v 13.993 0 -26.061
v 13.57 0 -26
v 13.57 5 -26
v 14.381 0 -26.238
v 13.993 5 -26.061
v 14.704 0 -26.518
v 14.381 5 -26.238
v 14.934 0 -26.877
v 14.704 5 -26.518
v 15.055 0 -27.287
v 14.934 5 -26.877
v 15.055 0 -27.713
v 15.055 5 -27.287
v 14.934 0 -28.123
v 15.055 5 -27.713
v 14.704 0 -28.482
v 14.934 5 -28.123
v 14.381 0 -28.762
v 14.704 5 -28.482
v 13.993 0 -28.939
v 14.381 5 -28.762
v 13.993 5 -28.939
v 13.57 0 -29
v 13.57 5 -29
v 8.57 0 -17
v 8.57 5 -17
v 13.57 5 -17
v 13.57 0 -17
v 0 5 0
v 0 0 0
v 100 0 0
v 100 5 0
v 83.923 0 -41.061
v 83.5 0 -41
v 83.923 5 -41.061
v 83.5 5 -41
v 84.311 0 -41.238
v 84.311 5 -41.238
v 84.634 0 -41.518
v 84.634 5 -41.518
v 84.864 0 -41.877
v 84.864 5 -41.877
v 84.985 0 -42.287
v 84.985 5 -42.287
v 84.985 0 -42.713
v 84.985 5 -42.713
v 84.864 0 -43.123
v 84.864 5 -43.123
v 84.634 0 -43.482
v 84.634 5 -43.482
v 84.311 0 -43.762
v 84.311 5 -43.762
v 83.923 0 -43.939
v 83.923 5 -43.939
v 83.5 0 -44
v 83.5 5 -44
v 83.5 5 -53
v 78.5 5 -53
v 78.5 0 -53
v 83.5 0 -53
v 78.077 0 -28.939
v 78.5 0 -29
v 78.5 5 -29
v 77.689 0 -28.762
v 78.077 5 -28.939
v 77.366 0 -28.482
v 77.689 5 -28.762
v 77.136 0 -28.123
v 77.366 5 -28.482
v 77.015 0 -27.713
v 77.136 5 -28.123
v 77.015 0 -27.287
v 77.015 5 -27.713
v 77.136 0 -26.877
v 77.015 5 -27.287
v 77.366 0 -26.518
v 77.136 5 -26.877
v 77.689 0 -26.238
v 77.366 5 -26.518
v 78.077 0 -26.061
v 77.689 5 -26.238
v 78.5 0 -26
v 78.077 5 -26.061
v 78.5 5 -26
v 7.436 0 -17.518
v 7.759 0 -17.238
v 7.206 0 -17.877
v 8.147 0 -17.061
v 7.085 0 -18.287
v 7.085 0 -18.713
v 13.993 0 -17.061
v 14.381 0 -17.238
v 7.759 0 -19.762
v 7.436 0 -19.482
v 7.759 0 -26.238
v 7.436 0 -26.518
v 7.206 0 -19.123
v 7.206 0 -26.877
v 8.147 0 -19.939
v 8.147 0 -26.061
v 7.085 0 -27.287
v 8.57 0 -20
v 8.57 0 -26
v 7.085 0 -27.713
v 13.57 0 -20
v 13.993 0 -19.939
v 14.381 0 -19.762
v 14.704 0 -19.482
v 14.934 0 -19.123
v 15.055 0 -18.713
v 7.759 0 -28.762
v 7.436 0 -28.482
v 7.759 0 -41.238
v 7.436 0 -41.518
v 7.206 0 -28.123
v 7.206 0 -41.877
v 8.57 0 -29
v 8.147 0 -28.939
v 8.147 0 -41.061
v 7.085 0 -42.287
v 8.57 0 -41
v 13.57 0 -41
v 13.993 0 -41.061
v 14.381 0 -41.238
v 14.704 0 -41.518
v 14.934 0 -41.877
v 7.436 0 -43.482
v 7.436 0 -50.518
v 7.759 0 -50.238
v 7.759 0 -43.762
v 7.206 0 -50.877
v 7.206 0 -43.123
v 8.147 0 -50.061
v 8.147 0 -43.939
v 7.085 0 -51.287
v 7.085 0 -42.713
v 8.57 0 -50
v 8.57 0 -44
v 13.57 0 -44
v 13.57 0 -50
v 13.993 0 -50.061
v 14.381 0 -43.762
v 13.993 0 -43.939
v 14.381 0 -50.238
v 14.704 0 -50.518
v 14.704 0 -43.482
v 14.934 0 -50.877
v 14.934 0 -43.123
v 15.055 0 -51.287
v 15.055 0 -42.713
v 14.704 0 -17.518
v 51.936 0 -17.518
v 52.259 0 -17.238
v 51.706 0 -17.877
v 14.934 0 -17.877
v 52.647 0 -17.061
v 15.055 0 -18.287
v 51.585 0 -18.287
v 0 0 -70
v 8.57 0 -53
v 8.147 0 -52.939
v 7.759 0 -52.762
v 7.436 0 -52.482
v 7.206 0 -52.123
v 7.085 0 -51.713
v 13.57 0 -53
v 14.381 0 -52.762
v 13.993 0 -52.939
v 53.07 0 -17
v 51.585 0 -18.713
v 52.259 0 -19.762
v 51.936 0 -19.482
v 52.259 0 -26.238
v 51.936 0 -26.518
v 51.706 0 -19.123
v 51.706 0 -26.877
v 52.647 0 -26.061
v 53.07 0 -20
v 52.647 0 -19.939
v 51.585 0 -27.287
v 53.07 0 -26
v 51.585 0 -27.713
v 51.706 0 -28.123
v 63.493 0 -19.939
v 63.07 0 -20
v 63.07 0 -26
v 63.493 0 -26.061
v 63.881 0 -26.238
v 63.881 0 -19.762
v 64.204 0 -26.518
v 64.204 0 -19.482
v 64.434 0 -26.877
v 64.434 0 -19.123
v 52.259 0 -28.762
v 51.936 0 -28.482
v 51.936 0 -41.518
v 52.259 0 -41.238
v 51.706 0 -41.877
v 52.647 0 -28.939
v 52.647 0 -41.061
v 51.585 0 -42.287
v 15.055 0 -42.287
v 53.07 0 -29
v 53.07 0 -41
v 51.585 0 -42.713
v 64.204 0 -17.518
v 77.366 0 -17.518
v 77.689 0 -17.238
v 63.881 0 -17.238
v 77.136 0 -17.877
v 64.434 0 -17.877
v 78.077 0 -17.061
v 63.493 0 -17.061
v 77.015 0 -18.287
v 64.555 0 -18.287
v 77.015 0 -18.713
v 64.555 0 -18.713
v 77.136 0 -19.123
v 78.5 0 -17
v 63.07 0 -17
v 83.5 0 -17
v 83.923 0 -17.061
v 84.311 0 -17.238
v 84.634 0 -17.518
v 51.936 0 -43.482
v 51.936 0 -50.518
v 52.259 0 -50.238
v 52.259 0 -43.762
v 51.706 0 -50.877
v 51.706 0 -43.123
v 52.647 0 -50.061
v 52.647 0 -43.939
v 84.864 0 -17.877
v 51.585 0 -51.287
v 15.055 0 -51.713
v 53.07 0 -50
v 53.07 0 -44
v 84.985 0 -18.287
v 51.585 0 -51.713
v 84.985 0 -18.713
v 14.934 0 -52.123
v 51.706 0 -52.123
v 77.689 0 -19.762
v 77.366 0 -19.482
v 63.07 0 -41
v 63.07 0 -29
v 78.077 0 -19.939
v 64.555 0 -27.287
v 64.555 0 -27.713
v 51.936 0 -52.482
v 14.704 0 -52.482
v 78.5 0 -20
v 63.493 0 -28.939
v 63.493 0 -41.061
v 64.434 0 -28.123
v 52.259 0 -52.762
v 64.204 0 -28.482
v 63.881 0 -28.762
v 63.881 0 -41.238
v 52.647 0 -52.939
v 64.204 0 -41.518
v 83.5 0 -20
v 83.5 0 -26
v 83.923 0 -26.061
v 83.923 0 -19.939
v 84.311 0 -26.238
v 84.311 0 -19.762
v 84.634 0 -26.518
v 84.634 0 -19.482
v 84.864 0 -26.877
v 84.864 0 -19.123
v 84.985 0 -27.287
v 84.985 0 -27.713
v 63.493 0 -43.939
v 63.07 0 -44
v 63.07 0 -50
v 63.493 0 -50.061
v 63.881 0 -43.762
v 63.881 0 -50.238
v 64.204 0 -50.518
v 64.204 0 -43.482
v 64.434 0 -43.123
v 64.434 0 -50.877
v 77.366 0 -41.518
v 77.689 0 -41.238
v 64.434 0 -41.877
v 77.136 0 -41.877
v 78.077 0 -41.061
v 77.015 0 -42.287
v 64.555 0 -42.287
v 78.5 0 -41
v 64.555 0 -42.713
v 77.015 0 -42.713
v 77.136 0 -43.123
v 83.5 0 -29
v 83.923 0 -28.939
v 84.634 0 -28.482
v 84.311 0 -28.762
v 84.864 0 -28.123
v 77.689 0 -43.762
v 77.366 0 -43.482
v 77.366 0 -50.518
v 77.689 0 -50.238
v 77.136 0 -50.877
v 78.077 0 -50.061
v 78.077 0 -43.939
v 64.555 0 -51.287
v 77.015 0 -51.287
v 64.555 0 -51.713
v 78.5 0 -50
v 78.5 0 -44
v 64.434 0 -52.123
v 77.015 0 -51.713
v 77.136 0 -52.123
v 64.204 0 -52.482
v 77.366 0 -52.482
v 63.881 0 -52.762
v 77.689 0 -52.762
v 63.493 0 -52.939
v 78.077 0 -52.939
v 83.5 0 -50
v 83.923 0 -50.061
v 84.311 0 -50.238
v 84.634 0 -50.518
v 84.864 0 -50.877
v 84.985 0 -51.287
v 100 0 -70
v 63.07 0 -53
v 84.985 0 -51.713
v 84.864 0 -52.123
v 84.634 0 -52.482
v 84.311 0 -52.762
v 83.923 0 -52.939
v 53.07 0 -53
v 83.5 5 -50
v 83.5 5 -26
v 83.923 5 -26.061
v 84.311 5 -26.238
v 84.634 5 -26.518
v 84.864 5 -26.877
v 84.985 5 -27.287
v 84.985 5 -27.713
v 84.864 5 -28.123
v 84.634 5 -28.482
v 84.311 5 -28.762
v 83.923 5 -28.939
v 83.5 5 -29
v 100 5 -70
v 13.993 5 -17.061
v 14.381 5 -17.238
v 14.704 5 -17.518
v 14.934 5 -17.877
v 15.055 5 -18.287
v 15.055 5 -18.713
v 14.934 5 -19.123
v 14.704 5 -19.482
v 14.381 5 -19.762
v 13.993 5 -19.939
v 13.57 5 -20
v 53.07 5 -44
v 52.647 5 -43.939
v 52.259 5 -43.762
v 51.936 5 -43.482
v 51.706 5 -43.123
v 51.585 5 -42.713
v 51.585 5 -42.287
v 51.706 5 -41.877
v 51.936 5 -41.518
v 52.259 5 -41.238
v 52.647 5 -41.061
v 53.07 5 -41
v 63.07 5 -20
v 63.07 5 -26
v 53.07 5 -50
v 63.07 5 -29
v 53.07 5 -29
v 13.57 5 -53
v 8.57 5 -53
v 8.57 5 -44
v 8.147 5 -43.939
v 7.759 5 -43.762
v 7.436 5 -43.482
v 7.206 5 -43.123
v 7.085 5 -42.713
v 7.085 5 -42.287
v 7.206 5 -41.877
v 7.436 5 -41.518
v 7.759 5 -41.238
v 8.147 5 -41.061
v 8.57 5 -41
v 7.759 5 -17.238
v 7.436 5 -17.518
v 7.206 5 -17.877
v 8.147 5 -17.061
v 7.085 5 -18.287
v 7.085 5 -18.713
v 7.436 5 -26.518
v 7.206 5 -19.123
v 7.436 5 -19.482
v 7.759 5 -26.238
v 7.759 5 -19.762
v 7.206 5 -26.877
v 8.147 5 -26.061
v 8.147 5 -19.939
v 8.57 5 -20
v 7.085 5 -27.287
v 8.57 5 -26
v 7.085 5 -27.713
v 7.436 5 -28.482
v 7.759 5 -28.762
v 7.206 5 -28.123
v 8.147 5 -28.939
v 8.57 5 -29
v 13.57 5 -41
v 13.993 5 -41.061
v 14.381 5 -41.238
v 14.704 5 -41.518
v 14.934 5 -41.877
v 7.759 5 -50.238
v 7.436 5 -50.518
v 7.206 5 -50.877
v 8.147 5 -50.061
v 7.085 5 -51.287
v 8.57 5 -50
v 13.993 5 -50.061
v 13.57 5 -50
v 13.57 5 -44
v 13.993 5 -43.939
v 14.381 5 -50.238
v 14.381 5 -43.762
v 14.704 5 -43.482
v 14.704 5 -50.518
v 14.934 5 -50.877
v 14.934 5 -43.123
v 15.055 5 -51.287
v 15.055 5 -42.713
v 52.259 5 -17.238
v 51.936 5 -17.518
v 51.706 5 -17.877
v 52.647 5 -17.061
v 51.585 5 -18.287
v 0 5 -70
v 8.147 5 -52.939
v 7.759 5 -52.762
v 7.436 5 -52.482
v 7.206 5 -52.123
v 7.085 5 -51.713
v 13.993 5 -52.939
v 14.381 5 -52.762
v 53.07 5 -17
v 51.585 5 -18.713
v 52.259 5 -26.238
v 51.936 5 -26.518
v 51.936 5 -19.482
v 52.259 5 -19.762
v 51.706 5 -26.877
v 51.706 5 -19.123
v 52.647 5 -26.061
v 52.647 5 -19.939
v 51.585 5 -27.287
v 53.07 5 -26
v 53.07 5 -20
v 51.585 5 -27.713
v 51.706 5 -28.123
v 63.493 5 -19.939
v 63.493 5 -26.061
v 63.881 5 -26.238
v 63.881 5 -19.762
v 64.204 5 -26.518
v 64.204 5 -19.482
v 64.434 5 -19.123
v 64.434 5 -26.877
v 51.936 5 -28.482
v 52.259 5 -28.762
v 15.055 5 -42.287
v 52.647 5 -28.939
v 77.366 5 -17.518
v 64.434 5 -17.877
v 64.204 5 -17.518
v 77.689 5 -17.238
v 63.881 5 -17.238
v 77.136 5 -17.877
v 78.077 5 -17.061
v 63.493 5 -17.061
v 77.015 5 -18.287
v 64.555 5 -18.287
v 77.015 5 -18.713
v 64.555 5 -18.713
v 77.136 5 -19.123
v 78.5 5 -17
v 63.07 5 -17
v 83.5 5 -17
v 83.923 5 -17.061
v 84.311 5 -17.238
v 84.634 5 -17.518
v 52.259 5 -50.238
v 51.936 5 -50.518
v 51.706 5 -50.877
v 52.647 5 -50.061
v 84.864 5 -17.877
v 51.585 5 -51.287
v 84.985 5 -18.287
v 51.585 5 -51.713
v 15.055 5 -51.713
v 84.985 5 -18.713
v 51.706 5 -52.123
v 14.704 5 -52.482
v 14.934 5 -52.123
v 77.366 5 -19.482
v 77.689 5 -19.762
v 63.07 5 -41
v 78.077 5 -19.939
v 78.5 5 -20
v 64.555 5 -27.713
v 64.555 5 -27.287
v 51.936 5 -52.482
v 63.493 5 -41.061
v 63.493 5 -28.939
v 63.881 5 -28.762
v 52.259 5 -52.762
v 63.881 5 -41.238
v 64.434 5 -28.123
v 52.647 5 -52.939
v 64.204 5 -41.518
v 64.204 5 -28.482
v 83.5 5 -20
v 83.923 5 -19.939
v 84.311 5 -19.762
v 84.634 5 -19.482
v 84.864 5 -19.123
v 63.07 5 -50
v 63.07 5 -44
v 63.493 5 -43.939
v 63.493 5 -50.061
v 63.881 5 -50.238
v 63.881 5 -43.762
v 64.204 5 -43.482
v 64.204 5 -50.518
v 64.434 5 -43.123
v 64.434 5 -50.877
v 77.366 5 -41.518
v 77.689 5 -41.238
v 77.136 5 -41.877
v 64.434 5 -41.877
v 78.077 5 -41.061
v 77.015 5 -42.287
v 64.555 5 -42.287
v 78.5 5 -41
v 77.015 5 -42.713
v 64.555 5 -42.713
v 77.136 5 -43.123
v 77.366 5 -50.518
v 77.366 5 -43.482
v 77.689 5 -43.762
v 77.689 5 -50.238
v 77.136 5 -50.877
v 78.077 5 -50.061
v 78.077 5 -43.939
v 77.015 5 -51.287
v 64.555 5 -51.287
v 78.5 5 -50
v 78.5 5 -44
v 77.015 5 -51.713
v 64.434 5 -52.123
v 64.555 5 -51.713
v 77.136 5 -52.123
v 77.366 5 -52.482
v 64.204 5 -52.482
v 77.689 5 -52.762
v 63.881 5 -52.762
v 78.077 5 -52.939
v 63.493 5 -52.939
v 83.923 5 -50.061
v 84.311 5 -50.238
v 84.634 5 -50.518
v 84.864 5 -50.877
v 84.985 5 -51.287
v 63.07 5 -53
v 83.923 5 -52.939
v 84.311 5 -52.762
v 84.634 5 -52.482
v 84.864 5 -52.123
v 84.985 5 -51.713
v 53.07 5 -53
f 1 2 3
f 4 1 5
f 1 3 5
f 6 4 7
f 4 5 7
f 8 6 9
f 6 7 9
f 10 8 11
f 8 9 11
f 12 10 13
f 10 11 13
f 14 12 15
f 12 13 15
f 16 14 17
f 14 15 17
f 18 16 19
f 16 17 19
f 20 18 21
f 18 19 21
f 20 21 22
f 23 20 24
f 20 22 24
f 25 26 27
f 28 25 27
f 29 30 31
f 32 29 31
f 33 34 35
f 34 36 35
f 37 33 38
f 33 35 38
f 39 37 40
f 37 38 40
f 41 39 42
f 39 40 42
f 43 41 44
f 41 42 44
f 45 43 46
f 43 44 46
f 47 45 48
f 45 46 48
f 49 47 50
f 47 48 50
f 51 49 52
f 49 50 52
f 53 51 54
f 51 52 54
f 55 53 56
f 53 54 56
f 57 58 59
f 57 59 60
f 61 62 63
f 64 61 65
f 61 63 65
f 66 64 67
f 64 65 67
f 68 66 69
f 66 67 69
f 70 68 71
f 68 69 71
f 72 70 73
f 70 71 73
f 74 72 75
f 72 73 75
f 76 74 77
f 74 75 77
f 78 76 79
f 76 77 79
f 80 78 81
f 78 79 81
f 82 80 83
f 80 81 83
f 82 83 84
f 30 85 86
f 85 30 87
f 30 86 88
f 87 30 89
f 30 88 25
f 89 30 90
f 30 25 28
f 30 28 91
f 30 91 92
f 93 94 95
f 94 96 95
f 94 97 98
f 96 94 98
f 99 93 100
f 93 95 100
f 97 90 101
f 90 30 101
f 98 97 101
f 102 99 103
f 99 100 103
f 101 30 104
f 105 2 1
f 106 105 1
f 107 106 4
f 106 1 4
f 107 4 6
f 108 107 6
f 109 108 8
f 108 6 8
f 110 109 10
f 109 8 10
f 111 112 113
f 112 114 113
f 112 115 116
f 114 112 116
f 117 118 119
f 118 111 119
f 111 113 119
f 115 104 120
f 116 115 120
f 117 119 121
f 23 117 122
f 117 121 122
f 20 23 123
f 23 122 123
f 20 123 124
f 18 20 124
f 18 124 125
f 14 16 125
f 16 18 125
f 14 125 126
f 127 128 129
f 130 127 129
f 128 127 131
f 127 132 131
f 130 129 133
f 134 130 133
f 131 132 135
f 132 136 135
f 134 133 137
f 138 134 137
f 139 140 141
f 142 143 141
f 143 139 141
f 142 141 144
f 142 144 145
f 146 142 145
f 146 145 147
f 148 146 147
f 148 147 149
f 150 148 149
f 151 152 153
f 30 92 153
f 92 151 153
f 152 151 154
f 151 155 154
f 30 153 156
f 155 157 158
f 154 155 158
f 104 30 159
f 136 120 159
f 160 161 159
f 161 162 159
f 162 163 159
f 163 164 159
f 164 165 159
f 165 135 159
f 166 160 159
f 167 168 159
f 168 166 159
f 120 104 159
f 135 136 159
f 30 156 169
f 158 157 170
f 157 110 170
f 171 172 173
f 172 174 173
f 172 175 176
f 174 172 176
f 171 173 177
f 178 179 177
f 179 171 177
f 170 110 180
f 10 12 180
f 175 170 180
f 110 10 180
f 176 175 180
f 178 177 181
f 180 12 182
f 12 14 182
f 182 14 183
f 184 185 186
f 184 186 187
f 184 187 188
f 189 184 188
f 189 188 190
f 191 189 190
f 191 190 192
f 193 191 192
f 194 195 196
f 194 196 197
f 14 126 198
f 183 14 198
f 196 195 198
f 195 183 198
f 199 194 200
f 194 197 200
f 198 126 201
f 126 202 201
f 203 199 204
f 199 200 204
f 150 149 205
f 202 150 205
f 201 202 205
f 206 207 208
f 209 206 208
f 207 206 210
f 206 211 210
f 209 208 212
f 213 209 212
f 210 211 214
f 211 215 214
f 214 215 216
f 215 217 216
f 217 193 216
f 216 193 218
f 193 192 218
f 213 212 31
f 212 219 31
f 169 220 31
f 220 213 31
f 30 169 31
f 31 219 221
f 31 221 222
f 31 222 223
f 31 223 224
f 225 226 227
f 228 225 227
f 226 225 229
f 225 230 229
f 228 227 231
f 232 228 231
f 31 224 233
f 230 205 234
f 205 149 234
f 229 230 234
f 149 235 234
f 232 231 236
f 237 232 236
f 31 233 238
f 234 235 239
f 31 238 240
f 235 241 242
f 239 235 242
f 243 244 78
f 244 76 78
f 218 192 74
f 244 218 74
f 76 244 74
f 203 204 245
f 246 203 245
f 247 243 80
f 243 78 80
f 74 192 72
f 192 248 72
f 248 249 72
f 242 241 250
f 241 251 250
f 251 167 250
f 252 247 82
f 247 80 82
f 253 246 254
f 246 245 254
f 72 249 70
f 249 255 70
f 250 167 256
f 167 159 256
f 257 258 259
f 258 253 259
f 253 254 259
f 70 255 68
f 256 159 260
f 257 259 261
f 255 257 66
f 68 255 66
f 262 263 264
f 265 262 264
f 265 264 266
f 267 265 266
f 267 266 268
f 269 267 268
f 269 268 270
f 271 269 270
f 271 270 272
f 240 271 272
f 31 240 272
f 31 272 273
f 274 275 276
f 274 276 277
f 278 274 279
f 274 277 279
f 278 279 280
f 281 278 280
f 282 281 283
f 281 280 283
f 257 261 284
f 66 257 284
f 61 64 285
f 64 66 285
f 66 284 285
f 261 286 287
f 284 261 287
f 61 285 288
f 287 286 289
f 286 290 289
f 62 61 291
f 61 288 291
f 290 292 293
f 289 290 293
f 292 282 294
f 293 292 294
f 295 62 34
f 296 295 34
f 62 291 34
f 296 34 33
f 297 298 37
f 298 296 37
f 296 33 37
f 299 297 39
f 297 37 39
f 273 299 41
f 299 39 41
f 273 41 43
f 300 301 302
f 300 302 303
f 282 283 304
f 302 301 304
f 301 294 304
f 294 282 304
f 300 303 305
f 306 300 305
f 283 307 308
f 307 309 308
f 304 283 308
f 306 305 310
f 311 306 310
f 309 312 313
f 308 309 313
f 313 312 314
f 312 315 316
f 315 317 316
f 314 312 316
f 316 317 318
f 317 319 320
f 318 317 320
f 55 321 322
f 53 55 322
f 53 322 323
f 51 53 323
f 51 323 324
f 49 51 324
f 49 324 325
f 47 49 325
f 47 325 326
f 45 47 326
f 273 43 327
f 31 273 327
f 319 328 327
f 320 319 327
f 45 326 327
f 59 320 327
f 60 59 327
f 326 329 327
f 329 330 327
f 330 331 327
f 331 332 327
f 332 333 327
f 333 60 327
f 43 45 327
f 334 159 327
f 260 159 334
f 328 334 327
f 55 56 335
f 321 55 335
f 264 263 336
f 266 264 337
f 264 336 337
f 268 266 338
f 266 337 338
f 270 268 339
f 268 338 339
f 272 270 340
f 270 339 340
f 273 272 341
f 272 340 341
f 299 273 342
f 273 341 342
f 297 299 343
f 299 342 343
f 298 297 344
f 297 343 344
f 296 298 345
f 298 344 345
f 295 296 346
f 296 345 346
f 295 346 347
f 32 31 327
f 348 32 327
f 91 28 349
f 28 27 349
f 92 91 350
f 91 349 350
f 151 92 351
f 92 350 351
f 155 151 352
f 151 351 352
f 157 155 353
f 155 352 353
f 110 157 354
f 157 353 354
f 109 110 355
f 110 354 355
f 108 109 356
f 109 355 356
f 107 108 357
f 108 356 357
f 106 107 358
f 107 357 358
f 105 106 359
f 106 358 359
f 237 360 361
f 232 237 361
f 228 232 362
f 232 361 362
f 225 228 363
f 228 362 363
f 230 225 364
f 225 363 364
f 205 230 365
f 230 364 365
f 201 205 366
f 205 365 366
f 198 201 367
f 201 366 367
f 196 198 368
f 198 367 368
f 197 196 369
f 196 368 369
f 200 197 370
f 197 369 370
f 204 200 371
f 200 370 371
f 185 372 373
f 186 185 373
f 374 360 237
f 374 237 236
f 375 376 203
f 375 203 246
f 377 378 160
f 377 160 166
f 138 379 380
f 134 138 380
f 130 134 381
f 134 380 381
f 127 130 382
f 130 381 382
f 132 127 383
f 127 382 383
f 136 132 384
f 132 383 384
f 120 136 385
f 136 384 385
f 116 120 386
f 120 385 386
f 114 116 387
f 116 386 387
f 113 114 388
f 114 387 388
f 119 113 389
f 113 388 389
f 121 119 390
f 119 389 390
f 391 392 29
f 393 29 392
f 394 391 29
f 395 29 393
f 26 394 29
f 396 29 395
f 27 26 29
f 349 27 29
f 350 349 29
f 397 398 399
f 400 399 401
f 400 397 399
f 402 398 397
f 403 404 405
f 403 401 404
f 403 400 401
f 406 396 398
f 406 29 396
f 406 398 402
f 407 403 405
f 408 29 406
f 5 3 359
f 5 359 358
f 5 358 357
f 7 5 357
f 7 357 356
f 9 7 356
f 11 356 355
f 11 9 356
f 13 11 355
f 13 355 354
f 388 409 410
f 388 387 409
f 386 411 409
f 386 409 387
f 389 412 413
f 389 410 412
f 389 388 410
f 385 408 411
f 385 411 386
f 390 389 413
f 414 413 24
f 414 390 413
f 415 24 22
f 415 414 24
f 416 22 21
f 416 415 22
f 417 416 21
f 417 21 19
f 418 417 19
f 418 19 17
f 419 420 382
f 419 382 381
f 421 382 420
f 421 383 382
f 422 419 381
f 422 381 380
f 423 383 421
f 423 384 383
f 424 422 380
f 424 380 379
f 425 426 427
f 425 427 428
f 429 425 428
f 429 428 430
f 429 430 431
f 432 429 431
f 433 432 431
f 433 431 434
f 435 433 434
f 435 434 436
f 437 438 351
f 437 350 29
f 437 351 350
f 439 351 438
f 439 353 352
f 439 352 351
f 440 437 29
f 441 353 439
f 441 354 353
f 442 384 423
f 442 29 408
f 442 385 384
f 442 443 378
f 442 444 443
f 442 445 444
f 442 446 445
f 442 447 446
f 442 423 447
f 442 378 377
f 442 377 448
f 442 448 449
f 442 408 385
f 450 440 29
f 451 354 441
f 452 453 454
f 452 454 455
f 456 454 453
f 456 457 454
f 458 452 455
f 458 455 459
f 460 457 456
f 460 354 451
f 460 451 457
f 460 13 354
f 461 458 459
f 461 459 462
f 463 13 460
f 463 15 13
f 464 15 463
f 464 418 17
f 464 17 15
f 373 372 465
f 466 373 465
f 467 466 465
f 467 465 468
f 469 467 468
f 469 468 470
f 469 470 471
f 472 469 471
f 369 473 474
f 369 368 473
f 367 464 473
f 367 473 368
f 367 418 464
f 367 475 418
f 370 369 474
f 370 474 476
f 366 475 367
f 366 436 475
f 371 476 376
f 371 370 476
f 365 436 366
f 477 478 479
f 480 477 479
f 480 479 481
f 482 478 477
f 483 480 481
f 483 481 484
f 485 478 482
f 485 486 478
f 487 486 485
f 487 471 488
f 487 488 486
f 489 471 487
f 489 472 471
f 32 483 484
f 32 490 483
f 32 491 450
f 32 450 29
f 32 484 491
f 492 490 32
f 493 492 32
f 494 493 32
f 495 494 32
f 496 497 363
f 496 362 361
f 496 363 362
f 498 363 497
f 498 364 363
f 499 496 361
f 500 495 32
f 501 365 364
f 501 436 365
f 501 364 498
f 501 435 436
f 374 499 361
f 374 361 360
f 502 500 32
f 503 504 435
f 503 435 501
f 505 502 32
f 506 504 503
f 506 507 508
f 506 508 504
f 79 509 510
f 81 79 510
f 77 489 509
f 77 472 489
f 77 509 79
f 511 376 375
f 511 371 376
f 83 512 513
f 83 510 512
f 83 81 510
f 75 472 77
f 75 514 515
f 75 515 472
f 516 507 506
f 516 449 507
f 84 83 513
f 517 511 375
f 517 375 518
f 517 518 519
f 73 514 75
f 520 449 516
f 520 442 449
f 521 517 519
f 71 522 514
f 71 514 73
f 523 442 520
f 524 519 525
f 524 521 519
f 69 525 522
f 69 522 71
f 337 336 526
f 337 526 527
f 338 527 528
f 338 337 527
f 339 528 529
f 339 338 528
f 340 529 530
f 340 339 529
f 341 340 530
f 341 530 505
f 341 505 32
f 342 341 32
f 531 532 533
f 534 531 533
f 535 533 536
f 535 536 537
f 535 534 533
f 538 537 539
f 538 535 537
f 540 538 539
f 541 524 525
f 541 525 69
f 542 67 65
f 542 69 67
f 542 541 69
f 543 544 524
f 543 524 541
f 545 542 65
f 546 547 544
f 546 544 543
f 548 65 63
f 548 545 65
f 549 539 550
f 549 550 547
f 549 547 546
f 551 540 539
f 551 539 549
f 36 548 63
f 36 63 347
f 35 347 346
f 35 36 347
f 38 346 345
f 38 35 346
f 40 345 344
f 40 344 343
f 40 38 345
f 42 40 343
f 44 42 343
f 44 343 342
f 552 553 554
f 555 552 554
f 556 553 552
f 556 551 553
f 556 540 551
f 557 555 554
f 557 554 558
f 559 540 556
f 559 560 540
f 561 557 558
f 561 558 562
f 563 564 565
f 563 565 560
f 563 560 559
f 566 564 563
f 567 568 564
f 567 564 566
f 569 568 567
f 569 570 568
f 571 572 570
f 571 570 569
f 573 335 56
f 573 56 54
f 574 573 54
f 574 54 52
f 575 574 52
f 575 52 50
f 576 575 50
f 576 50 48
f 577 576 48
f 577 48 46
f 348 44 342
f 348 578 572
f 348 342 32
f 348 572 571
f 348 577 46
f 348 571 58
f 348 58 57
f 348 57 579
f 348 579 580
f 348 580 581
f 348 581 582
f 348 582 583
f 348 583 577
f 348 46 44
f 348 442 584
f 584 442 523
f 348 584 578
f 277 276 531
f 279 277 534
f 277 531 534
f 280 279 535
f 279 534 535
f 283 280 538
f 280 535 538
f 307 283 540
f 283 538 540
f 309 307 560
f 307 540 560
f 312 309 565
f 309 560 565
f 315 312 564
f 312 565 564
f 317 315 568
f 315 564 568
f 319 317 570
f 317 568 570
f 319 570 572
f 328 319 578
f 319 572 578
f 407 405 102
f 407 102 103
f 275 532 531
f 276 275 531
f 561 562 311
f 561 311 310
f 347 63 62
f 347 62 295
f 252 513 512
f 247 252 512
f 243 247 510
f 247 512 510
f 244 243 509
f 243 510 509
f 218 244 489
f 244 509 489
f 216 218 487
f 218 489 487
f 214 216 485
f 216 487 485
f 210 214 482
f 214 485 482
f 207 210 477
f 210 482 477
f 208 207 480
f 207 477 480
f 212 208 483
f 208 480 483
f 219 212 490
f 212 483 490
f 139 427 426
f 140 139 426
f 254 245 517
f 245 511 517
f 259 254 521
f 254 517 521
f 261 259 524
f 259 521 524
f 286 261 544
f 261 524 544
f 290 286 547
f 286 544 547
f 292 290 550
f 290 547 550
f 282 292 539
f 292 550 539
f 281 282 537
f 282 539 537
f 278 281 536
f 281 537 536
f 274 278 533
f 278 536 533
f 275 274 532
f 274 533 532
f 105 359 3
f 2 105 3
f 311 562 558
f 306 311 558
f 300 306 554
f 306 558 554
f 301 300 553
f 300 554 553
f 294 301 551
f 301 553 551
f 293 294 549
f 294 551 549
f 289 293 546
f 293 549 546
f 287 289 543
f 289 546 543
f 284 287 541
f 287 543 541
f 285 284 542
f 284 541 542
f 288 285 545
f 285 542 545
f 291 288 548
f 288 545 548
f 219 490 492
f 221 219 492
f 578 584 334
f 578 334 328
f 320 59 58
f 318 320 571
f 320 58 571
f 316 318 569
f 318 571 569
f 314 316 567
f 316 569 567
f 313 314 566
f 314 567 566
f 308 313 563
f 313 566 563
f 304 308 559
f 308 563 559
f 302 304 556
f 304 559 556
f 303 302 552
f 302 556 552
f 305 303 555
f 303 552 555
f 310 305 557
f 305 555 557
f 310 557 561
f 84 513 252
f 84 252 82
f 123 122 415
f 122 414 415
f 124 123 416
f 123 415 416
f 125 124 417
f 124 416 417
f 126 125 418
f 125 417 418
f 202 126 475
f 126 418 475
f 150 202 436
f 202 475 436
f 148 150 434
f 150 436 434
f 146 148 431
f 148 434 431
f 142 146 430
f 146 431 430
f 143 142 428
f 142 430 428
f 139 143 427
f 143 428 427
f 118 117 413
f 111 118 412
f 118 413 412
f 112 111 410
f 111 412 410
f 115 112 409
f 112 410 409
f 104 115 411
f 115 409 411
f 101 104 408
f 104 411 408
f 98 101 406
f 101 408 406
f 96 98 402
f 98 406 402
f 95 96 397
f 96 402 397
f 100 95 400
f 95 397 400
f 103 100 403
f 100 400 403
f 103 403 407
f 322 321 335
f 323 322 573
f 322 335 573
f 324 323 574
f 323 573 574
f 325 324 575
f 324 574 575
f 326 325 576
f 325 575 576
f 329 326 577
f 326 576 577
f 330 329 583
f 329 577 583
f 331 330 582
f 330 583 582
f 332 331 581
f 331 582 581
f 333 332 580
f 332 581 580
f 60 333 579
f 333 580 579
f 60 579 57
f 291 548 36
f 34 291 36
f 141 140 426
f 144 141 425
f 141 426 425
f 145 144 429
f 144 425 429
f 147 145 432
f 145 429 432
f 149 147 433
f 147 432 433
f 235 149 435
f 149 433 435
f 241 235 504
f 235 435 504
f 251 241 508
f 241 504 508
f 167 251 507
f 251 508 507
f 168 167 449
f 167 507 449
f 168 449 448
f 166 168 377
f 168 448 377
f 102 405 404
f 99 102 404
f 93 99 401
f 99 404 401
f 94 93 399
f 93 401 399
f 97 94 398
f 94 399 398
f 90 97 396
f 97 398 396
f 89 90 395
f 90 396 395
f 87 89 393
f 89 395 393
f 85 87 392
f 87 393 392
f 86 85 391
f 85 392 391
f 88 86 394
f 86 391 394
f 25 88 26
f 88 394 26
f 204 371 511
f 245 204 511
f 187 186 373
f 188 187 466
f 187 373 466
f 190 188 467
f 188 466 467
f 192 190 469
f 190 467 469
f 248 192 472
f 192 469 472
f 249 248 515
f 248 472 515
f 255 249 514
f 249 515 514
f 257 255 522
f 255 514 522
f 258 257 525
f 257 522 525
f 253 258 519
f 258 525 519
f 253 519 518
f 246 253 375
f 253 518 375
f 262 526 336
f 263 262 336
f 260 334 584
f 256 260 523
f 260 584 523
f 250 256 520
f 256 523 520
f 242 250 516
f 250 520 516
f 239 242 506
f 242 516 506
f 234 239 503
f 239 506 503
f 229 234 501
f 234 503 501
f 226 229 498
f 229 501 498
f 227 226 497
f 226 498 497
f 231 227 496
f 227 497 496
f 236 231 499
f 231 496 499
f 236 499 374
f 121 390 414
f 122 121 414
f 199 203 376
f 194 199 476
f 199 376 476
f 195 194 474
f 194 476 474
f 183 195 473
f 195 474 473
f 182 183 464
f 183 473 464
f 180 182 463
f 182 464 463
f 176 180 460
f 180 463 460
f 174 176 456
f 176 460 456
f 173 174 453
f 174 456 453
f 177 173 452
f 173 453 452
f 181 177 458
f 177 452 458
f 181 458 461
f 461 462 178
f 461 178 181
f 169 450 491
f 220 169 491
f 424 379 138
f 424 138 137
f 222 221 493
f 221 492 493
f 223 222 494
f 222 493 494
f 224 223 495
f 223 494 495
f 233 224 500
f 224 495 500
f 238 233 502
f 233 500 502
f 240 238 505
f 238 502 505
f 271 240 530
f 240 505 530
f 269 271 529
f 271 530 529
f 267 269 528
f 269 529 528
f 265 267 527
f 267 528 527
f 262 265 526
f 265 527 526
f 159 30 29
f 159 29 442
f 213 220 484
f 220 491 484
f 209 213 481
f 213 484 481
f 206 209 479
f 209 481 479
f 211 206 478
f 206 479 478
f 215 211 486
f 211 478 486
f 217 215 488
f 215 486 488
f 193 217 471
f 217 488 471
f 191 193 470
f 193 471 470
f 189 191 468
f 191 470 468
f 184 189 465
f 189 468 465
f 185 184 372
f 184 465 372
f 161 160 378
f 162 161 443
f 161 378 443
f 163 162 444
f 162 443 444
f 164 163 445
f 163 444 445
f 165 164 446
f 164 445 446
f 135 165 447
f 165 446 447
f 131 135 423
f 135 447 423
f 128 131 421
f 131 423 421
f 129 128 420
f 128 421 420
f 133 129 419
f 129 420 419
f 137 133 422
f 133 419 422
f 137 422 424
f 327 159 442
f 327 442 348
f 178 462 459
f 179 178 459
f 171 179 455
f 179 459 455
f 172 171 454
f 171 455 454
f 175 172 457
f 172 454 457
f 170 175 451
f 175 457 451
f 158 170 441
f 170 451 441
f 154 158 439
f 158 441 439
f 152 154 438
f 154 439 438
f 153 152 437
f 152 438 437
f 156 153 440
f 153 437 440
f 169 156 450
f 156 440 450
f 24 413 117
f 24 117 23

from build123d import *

# Parameters (mm, degrees)
SKETCH_1_W          = 100
SKETCH_1_H          = 70
EXTRUDE_1_DEPTH     = 5
SKETCH_2_W          = 10
SKETCH_2_H          = 12
SKETCH_2_W_2        = 5
CUT_EXTRUDE_1_DEPTH = 10
SKETCH_3_R          = 1.5
CUT_EXTRUDE_2_DEPTH = 5


with BuildPart() as part:
    # 스케치1 → 보스-돌출1 (new body)
    with BuildSketch(Plane(origin=(0, 0, 0), x_dir=(1, 0, 0), z_dir=(0, 1, 0))):
        with Locations((50, 35)):
            Rectangle(SKETCH_1_W, SKETCH_1_H)
    extrude(amount=EXTRUDE_1_DEPTH)

    # 스케치2 → 컷-돌출1 (cut)
    with BuildSketch(Plane(origin=(0, 5, 0), x_dir=(1, 0, 0), z_dir=(0, 1, 0))):
        with Locations((58.07, 47)):
            Rectangle(SKETCH_2_W, SKETCH_2_H)
        with Locations((58.07, 23)):
            Rectangle(SKETCH_2_W, SKETCH_2_H)
        with Locations((81, 47)):
            Rectangle(SKETCH_2_W_2, SKETCH_2_H)
        with Locations((81, 23)):
            Rectangle(SKETCH_2_W_2, SKETCH_2_H)
        with Locations((11.07, 47)):
            Rectangle(SKETCH_2_W_2, SKETCH_2_H)
        with Locations((11.07, 23)):
            Rectangle(SKETCH_2_W_2, SKETCH_2_H)
    extrude(amount=-CUT_EXTRUDE_1_DEPTH, mode=Mode.SUBTRACT)

    # 스케치3 → 컷-돌출2 (cut)
    with BuildSketch(Plane(origin=(0, 5, 0), x_dir=(1, 0, 0), z_dir=(0, 1, 0))):
        with Locations((8.57, 51.5)):
            Circle(SKETCH_3_R)
        with Locations((13.57, 51.5)):
            Circle(SKETCH_3_R)
        with Locations((8.57, 42.5)):
            Circle(SKETCH_3_R)
        with Locations((13.57, 42.5)):
            Circle(SKETCH_3_R)
        with Locations((8.57, 27.5)):
            Circle(SKETCH_3_R)
        with Locations((13.57, 27.5)):
            Circle(SKETCH_3_R)
        with Locations((13.57, 18.5)):
            Circle(SKETCH_3_R)
        with Locations((8.57, 18.5)):
            Circle(SKETCH_3_R)
        with Locations((63.07, 18.5)):
            Circle(SKETCH_3_R)
        with Locations((53.07, 18.5)):
            Circle(SKETCH_3_R)
        with Locations((53.07, 27.5)):
            Circle(SKETCH_3_R)
        with Locations((63.07, 27.5)):
            Circle(SKETCH_3_R)
        with Locations((78.5, 27.5)):
            Circle(SKETCH_3_R)
        with Locations((83.5, 27.5)):
            Circle(SKETCH_3_R)
        with Locations((78.5, 18.5)):
            Circle(SKETCH_3_R)
        with Locations((83.5, 18.5)):
            Circle(SKETCH_3_R)
        with Locations((78.5, 42.5)):
            Circle(SKETCH_3_R)
        with Locations((83.5, 42.5)):
            Circle(SKETCH_3_R)
        with Locations((78.5, 51.5)):
            Circle(SKETCH_3_R)
        with Locations((83.5, 51.5)):
            Circle(SKETCH_3_R)
        with Locations((63.07, 51.5)):
            Circle(SKETCH_3_R)
        with Locations((53.07, 51.5)):
            Circle(SKETCH_3_R)
        with Locations((53.07, 42.5)):
            Circle(SKETCH_3_R)
        with Locations((63.07, 42.5)):
            Circle(SKETCH_3_R)
    extrude(amount=-CUT_EXTRUDE_2_DEPTH, mode=Mode.SUBTRACT)


solid = part.part
